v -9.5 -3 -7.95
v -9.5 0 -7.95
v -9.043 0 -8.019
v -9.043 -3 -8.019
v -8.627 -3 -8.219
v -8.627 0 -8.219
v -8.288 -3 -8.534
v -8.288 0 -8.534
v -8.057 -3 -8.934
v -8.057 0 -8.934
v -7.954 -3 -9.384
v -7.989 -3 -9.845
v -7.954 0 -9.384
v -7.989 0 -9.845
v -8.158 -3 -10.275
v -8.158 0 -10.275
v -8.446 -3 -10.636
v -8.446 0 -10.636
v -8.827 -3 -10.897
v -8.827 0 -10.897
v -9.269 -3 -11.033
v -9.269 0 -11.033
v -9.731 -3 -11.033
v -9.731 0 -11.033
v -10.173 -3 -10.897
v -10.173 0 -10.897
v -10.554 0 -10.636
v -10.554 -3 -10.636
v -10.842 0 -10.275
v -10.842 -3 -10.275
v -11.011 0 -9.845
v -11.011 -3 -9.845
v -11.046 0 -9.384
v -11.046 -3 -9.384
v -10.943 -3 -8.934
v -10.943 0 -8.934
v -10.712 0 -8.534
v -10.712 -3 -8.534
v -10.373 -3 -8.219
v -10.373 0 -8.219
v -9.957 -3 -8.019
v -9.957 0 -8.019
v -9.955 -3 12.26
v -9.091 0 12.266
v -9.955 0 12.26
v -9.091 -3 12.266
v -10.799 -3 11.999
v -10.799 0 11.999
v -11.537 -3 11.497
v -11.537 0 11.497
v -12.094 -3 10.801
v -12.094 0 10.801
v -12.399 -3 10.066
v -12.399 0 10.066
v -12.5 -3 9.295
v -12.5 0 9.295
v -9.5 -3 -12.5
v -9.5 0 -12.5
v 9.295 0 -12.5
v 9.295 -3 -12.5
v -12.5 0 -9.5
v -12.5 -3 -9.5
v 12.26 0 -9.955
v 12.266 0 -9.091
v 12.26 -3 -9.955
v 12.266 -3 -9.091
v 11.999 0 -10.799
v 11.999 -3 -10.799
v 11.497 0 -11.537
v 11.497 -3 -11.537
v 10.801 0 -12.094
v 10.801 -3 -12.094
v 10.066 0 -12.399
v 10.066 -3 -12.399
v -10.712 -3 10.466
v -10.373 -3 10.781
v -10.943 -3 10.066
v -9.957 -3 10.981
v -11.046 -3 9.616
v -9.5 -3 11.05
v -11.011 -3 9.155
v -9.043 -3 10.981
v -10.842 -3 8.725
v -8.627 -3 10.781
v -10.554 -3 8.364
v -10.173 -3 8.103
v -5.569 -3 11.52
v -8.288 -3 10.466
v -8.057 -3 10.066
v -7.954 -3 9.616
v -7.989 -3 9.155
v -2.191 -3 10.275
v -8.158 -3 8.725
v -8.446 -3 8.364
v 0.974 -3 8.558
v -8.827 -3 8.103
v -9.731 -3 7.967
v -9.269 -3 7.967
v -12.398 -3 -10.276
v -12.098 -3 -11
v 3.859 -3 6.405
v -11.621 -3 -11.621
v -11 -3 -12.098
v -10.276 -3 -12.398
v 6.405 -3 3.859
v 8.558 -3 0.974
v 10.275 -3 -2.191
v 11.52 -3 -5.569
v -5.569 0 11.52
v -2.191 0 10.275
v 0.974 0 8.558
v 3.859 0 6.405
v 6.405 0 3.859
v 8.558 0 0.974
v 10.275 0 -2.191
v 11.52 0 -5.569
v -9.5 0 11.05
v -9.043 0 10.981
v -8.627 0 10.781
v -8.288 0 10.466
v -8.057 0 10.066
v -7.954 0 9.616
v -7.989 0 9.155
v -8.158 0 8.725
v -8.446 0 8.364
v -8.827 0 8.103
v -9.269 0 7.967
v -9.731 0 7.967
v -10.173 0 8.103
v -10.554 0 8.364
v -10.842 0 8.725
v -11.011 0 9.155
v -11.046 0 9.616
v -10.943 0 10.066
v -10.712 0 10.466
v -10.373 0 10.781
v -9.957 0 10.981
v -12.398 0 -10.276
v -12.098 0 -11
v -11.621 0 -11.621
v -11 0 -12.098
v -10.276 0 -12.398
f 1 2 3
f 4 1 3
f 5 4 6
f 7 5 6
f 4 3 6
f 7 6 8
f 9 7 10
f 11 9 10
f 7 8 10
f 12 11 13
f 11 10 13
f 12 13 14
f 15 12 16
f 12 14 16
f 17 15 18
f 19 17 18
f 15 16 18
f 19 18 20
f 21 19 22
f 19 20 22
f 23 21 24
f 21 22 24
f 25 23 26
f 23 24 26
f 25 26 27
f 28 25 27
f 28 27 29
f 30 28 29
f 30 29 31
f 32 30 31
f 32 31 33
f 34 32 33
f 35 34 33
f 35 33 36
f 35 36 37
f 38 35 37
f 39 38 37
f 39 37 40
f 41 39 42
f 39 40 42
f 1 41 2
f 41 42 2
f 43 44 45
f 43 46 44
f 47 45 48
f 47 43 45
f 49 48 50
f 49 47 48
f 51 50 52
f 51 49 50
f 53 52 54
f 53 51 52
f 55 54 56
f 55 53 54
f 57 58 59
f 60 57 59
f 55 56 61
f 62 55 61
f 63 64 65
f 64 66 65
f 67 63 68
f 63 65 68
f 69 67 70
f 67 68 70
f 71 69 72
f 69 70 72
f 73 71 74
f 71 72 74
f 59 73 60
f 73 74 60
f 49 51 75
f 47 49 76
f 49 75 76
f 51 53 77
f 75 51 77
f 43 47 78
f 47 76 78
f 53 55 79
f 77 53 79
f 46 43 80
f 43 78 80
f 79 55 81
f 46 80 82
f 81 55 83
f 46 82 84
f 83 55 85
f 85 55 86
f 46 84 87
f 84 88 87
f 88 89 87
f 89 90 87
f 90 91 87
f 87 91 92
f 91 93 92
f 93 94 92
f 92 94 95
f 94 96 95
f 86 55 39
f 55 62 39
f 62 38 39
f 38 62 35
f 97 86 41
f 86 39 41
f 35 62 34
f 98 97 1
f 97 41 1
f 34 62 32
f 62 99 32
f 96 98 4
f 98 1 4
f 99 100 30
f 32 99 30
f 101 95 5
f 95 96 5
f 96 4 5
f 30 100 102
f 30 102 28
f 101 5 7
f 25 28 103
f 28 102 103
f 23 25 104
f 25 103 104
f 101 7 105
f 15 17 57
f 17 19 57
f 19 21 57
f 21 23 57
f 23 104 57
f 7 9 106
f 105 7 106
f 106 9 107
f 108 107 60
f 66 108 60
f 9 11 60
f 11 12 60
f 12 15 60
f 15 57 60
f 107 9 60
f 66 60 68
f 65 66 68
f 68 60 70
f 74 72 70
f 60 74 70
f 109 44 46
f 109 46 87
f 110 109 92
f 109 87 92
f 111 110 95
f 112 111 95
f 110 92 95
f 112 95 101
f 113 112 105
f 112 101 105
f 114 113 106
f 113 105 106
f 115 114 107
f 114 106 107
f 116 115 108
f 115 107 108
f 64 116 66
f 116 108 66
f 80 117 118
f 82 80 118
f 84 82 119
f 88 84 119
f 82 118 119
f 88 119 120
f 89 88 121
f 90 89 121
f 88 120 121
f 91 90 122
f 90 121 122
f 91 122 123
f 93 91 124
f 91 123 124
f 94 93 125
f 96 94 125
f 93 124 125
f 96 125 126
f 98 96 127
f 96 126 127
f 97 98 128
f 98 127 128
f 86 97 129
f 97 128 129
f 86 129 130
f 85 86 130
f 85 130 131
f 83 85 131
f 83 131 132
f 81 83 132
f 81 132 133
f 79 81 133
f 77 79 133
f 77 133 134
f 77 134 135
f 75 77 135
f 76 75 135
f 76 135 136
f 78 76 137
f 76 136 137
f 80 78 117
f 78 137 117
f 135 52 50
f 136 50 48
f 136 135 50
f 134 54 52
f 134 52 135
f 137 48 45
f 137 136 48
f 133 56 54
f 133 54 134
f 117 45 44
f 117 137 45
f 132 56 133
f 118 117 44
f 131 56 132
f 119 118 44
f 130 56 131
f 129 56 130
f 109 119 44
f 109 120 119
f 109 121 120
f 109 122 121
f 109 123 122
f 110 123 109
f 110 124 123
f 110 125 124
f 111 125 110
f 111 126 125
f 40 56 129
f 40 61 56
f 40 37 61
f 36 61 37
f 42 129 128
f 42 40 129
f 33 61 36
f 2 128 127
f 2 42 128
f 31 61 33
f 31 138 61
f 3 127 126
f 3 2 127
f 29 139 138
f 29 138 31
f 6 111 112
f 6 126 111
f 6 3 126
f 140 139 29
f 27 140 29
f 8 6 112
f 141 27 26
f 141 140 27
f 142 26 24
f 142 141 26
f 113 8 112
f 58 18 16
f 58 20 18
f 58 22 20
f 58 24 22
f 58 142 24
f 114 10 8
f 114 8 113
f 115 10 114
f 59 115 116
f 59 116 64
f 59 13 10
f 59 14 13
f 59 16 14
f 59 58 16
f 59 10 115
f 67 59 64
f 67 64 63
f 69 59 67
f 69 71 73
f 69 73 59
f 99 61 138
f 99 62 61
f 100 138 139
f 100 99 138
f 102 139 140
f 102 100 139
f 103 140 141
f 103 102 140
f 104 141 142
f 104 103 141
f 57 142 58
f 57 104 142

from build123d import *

# Parameters (mm, degrees)
SKETCH1_W           = 25
SKETCH1_H           = 25
SKETCH1_R           = 1.55
BOSS_EXTRUDE1_DEPTH = 3
FILLET1_R           = 25
FILLET2_R           = 3


with BuildPart() as part:
    # Sketch1 → Boss-Extrude1 (new body)
    with BuildSketch(Plane(origin=(0, 0, 0), x_dir=(1, 0, 0), z_dir=(0, 1, 0))):
        Rectangle(SKETCH1_W, SKETCH1_H)
        with Locations(Location((-9.5, 9.5, 0), (0, 0, 270))):
            Circle(SKETCH1_R, mode=Mode.SUBTRACT)
        with Locations(Location((-9.5, -9.5, 0), (0, 0, 270))):
            Circle(SKETCH1_R, mode=Mode.SUBTRACT)
    extrude(amount=-BOSS_EXTRUDE1_DEPTH)

    # Fillet1
    fillet1_edges = [part.edges().sort_by_distance(p)[0] for p in [
        (12.5, -1.5, 12.5),
    ]]
    fillet(fillet1_edges, radius=FILLET1_R - 0.0001)  # a hair under: the kernel refuses the full size

    # Fillet2
    fillet2_edges = [part.edges().sort_by_distance(p)[0] for p in [
        (-12.5, -1.5, 12.5),
        (-12.5, -1.5, -12.5),
        (12.5, -1.5, -12.5),
    ]]
    fillet(fillet2_edges, radius=FILLET2_R)


solid = part.part
